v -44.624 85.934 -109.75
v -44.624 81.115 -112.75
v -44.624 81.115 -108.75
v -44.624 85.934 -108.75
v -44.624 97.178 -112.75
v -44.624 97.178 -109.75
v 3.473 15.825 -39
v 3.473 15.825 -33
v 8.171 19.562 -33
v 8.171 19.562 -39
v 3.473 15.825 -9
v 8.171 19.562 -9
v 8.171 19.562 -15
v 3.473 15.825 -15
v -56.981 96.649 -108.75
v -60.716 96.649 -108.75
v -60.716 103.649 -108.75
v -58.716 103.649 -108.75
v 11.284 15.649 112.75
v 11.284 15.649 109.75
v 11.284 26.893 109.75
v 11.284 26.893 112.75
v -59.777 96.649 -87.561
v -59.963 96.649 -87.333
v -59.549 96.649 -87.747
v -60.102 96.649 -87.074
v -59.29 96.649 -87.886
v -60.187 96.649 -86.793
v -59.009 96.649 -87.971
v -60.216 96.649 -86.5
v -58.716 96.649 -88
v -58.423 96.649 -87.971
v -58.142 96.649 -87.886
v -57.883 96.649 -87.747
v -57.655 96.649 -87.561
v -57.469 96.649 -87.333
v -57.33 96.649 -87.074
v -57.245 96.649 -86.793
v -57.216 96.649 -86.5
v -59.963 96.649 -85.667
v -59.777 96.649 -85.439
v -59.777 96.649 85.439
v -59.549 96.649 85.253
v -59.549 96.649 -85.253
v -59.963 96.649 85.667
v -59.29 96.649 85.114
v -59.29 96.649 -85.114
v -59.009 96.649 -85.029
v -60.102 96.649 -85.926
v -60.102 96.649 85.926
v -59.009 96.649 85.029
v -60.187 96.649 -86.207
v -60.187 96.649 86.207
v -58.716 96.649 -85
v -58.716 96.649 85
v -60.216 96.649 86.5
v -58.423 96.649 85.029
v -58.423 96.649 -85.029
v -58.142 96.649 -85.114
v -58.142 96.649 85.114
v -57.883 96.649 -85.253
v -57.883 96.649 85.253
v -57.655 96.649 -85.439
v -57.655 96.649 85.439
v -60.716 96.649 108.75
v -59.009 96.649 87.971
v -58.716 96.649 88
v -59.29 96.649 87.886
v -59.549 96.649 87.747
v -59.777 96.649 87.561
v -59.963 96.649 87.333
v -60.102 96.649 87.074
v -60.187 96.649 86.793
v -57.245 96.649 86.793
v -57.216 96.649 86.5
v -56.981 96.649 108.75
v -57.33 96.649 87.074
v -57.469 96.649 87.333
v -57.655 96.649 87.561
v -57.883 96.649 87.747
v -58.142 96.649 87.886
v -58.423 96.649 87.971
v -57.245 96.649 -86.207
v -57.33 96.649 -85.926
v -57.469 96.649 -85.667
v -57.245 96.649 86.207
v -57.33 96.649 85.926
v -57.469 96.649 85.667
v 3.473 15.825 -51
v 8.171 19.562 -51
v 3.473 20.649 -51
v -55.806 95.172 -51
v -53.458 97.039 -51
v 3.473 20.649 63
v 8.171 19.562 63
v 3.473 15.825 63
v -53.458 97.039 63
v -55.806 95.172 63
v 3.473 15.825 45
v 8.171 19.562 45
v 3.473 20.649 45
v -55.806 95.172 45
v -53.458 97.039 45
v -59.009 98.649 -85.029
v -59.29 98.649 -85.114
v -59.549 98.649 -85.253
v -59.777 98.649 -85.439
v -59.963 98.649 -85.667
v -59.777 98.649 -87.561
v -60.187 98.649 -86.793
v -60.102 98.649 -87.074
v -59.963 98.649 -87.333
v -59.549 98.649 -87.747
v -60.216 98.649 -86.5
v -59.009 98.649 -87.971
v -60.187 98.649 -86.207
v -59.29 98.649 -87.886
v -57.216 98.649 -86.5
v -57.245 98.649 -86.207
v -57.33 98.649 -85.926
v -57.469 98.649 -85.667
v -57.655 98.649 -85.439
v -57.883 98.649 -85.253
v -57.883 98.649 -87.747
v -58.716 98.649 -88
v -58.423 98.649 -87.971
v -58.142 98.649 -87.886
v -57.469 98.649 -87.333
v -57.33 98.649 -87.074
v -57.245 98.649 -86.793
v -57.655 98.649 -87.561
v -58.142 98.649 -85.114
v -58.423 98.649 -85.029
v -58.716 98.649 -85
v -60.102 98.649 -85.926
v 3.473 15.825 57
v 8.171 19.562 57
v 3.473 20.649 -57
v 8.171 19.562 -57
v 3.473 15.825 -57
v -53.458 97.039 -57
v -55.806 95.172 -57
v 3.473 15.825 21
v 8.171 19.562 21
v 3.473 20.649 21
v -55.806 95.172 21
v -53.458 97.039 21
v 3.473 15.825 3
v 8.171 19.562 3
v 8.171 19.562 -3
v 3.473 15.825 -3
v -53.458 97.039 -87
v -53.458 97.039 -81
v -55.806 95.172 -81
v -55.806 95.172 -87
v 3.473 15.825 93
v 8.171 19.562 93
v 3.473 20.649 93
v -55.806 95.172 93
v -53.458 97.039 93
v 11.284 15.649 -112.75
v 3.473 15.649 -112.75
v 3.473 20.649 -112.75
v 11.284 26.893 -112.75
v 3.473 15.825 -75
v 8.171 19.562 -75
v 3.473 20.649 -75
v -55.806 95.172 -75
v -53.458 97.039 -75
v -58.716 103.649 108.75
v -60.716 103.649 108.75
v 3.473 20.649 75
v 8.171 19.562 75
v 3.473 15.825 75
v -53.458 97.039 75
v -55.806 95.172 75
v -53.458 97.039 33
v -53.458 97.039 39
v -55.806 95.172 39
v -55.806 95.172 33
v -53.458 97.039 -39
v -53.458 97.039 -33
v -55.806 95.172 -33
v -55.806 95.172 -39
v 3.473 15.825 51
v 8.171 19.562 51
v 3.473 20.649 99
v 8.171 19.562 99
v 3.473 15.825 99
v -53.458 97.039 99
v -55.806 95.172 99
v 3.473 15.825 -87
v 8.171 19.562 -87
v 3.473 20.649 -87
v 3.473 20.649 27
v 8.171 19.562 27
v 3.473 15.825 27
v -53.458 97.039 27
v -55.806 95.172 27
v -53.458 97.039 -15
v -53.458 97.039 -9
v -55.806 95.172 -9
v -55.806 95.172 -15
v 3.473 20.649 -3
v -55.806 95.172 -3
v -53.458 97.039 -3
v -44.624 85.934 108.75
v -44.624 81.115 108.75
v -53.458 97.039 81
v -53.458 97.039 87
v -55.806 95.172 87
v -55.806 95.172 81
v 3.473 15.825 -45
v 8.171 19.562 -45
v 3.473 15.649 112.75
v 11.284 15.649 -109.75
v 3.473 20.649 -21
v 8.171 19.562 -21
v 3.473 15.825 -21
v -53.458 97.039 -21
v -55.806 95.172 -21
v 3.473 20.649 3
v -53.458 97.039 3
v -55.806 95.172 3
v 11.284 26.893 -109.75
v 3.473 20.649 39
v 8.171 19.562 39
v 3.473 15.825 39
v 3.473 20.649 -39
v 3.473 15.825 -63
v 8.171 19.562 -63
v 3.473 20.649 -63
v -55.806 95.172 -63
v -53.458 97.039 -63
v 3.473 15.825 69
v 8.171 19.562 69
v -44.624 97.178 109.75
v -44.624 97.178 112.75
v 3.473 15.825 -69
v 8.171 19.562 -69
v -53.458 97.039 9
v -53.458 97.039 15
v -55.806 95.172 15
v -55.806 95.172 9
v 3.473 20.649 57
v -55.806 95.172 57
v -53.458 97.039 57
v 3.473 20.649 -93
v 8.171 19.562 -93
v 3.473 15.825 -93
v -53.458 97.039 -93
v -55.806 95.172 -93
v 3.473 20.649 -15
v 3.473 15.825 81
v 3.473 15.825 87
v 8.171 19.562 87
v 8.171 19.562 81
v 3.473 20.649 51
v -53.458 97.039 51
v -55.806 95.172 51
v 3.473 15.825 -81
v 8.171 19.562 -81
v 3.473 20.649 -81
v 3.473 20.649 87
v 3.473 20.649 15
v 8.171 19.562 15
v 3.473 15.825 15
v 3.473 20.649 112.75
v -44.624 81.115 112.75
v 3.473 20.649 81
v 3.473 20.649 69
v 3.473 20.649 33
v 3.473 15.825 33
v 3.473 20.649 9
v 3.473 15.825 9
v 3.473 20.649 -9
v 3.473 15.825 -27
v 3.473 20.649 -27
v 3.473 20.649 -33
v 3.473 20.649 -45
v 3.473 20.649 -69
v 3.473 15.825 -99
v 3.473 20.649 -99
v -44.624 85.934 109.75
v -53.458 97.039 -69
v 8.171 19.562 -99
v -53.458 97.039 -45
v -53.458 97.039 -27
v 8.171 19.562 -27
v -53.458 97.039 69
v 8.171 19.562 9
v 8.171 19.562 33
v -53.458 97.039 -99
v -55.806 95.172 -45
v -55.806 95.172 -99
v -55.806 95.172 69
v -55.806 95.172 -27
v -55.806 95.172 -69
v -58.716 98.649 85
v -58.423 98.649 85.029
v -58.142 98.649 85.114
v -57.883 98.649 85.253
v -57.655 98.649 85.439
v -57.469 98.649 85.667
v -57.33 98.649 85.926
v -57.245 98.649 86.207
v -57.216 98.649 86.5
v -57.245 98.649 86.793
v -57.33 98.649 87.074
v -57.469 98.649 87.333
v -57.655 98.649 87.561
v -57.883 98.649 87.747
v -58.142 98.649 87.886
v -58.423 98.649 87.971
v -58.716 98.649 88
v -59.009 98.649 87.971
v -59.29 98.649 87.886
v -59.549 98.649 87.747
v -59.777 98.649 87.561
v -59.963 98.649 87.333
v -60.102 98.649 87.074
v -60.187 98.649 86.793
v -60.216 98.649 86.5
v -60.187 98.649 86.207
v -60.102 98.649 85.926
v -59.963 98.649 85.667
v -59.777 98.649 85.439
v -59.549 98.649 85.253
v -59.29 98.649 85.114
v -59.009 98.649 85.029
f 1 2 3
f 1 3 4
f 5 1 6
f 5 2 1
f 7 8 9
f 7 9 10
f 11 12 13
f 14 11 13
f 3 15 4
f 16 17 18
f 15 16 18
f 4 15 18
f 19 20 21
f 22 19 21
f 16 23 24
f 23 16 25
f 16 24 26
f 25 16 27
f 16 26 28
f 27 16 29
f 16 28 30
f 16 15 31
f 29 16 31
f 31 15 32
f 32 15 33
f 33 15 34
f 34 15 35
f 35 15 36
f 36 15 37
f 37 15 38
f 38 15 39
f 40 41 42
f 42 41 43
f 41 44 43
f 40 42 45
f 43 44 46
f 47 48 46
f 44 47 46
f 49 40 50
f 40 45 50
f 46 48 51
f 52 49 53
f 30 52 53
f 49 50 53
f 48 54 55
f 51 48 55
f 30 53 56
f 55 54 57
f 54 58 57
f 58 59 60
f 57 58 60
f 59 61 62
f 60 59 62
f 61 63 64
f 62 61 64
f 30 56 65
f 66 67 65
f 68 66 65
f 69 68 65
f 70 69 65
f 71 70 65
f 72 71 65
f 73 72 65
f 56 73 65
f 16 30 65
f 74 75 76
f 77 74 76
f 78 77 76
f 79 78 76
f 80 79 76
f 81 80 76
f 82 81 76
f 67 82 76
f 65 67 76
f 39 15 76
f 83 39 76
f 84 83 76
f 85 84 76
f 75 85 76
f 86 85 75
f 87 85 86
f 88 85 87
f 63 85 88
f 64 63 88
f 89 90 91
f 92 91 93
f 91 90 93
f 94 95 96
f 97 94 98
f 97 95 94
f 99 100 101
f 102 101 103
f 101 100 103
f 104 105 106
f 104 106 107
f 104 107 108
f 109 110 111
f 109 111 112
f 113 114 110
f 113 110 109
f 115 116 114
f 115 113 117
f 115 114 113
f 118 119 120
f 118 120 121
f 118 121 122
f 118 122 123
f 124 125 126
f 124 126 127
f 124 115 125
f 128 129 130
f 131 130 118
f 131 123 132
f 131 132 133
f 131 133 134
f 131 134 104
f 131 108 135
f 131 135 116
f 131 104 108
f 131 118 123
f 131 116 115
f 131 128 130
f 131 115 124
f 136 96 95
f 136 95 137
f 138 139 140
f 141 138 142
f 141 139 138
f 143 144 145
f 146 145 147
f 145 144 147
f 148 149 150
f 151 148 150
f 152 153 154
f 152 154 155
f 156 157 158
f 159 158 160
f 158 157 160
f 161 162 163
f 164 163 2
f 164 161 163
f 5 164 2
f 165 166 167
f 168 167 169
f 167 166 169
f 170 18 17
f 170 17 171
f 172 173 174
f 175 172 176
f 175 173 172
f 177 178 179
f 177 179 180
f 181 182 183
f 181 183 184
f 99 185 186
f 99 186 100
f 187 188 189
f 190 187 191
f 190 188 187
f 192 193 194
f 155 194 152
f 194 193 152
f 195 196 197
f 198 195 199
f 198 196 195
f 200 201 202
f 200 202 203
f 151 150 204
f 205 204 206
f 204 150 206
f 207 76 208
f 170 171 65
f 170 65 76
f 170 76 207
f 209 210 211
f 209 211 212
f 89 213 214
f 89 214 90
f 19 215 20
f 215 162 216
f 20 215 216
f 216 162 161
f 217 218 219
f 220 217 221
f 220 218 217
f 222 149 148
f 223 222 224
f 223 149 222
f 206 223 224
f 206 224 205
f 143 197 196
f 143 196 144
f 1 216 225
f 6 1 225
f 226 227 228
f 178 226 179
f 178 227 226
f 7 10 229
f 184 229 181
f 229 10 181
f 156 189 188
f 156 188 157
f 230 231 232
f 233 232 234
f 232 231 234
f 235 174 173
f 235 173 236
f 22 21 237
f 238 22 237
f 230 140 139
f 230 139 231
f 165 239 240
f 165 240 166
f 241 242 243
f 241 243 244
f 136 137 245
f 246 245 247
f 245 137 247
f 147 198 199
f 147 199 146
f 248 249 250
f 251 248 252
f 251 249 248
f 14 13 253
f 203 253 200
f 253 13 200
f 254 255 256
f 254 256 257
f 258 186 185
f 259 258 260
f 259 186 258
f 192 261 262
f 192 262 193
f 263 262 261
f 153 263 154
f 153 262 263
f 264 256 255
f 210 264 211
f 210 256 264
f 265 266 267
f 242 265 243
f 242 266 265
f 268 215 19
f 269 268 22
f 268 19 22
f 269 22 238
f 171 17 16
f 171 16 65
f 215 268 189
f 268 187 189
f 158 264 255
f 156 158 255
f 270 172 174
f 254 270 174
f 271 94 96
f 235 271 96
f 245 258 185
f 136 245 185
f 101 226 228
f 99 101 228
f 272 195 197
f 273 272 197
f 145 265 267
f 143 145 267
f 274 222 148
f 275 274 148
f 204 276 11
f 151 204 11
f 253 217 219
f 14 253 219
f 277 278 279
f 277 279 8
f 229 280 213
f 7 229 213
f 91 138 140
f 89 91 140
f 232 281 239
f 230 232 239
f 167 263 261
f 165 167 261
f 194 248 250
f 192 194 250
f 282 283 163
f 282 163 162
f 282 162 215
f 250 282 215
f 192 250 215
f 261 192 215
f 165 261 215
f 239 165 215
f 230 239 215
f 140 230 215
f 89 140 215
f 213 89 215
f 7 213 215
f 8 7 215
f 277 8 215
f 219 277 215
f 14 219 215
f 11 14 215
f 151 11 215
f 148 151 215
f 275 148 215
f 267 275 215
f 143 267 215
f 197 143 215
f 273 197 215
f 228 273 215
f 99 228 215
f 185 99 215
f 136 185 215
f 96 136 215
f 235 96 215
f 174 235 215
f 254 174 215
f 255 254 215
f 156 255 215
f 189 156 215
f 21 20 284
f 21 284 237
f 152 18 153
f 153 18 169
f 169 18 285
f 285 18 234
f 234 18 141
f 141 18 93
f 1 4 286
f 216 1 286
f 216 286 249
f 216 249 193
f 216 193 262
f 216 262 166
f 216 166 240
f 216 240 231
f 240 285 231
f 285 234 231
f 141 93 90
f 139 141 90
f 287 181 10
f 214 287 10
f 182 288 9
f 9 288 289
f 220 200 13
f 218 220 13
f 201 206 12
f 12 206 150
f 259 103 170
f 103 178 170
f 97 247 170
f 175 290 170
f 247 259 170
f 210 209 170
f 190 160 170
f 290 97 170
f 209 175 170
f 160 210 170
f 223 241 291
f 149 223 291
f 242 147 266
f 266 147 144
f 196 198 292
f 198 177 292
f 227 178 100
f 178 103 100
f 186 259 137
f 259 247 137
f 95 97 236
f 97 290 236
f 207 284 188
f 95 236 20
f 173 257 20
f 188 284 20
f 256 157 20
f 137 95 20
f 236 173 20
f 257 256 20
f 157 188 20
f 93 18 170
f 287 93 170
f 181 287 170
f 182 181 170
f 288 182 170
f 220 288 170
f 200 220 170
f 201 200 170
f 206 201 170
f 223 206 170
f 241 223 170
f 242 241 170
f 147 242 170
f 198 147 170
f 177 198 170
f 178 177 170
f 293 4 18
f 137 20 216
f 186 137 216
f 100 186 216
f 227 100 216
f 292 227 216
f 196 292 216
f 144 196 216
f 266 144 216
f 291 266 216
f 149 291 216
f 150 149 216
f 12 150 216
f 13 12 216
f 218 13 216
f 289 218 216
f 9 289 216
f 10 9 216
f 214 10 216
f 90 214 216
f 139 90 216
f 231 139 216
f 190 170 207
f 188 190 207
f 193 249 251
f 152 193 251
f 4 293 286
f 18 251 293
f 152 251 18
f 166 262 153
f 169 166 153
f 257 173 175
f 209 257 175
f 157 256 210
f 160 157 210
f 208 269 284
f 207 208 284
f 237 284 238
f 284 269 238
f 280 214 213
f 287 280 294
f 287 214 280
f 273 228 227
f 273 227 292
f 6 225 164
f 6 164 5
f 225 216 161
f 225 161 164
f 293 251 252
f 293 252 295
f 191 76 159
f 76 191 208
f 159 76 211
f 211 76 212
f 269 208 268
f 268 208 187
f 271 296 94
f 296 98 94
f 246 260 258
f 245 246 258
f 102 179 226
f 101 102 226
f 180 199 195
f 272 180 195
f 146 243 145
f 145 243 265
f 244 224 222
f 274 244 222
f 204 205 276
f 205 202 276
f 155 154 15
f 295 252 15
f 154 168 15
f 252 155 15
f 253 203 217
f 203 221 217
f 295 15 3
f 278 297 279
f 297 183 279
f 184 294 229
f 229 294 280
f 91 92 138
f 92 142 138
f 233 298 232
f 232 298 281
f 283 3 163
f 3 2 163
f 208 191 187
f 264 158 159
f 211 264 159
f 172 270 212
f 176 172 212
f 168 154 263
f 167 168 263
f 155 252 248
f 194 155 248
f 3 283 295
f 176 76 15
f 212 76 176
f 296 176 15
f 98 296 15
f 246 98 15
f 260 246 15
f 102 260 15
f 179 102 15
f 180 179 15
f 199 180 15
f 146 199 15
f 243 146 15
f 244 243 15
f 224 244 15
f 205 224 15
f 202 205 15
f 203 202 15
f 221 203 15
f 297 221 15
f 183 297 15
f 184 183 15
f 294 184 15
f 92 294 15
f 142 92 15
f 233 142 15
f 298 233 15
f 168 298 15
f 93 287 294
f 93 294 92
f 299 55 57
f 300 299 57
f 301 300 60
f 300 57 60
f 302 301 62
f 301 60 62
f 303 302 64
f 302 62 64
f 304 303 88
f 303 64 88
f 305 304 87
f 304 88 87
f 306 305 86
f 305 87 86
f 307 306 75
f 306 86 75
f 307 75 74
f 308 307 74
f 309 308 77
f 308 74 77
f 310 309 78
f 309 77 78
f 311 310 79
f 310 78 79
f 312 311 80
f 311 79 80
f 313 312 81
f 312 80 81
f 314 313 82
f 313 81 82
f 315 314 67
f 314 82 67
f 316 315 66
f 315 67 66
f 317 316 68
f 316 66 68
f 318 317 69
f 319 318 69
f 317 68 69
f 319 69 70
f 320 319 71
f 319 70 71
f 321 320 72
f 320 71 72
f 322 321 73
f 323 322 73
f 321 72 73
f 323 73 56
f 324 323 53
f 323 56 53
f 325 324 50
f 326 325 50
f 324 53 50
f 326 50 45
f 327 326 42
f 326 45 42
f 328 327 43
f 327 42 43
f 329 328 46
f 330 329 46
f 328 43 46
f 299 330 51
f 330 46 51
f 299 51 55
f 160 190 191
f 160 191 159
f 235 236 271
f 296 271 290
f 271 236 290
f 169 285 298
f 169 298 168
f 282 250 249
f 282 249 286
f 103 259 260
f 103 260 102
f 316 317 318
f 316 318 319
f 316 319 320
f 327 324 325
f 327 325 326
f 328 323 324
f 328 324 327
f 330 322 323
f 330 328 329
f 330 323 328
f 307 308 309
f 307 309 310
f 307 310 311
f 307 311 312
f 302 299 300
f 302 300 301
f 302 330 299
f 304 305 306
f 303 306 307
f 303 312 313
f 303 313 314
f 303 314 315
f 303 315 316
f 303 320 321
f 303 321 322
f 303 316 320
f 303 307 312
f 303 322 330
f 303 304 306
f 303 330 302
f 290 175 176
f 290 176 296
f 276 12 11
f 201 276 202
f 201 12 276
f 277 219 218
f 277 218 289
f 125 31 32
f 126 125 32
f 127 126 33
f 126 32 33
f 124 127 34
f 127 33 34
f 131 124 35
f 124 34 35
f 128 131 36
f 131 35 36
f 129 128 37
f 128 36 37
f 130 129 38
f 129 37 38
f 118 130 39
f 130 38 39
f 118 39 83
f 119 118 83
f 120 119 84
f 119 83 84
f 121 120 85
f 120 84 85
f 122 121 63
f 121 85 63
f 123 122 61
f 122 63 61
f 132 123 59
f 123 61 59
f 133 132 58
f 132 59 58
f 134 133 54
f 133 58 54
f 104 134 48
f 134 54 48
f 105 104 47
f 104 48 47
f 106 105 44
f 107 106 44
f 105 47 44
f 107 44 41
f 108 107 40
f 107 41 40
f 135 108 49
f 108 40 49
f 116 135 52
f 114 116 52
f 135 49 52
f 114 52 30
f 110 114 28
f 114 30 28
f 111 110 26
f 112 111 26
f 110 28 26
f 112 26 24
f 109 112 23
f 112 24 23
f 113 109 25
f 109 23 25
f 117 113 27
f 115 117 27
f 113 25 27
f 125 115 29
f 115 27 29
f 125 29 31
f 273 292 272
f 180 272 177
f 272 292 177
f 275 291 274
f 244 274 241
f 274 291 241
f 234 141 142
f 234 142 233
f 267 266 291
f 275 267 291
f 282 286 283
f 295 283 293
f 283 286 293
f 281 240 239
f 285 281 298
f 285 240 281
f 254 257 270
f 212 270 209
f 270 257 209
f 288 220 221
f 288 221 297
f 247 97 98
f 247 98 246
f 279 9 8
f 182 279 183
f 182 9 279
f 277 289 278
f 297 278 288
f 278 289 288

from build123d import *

# Parameters (mm, degrees)
EXTRUDE_1_DEPTH     = 112
EXTRUDE_START       = -2.25
EXTRUDE_2_DEPTH     = 3
SKETCH_9_W          = 6
SKETCH_9_H          = 99
CUT_EXTRUDE_3_DEPTH = 10
SKETCH_10_W         = 225.5
SKETCH_10_H         = 7
EXTRUDE_3_DEPTH     = 2
SKETCH_5_R          = 1.5
CUT_EXTRUDE_2_DEPTH = 2
CUT_EXTRUDE_4_DEPTH = 4


with BuildPart() as part:
    # 草图1 → 凸台-拉伸1 (new, symmetric)
    with BuildSketch(Plane.XY):
        Polygon((11.28405341, 15.648913828), (3.47340992, 15.648913828), (3.47340992, 20.648913828), (-56.981135534, 96.648913828), (-58.71594659, 96.648913828), (-58.71594659, 103.648913828), align=None)
    extrude(amount=EXTRUDE_1_DEPTH, both=True)

    # 草图8 → 凸台-拉伸2 (add)
    with BuildSketch(Plane(origin=(0, 0, -112), x_dir=(-1, 0, 0), z_dir=(0, 0, -1)).offset(EXTRUDE_START)):
        Polygon((-3.47340992, 15.648913828), (-11.28405341, 15.648913828), (-11.28405341, 26.893468065), (49.77141481, 103.648913828), (58.71594659, 103.648913828), (58.71594659, 96.648913828), (56.981135534, 96.648913828), (-3.47340992, 20.648913828), align=None)
    extrude_2 = extrude(amount=EXTRUDE_2_DEPTH)

    # 镜向1: 凸台-拉伸2 across plane
    add(extrude_2.mirror(Plane.XY))

    # 草图9 → 切除-拉伸3 (cut)
    with BuildSketch(Plane(origin=(14.535037867, 11.561961939, 0), x_dir=(0, 0, -1), z_dir=(0.7826010541756485, 0.6225235658215388, 0))):
        with Locations((12, 59.722267293)):
            Rectangle(SKETCH_9_W, SKETCH_9_H)
        with Locations((0, 59.722267293)):
            Rectangle(SKETCH_9_W, SKETCH_9_H)
        with Locations((24, 59.722267293)):
            Rectangle(SKETCH_9_W, SKETCH_9_H)
        with Locations((36, 59.722267293)):
            Rectangle(SKETCH_9_W, SKETCH_9_H)
        with Locations((48, 59.722267293)):
            Rectangle(SKETCH_9_W, SKETCH_9_H)
        with Locations((60, 59.722267293)):
            Rectangle(SKETCH_9_W, SKETCH_9_H)
        with Locations((72, 59.722267293)):
            Rectangle(SKETCH_9_W, SKETCH_9_H)
        with Locations((84, 59.722267293)):
            Rectangle(SKETCH_9_W, SKETCH_9_H)
        with Locations((96, 59.722267293)):
            Rectangle(SKETCH_9_W, SKETCH_9_H)
        with Locations((-12, 59.722267293)):
            Rectangle(SKETCH_9_W, SKETCH_9_H)
        with Locations((-24, 59.722267293)):
            Rectangle(SKETCH_9_W, SKETCH_9_H)
        with Locations((-36, 59.722267293)):
            Rectangle(SKETCH_9_W, SKETCH_9_H)
        with Locations((-48, 59.722267293)):
            Rectangle(SKETCH_9_W, SKETCH_9_H)
        with Locations((-60, 59.722267293)):
            Rectangle(SKETCH_9_W, SKETCH_9_H)
        with Locations((-72, 59.722267293)):
            Rectangle(SKETCH_9_W, SKETCH_9_H)
        with Locations((-84, 59.722267293)):
            Rectangle(SKETCH_9_W, SKETCH_9_H)
        with Locations((-96, 59.722267293)):
            Rectangle(SKETCH_9_W, SKETCH_9_H)
    extrude(amount=-CUT_EXTRUDE_3_DEPTH, mode=Mode.SUBTRACT)

    # 草图10 → 凸台-拉伸3 (add)
    with BuildSketch(Plane.ZY.offset(58.71594659)):
        with Locations((0, 100.148913828)):
            Rectangle(SKETCH_10_W, SKETCH_10_H)
    extrude(amount=EXTRUDE_3_DEPTH)

    # 草图5 → 切除-拉伸2 (cut)
    with BuildSketch(Plane.XZ.offset(-96.648913828)):
        with Locations(Location((-58.71594659, -86.5, 0), (0, 0, 270))):
            Circle(SKETCH_5_R)
        with Locations(Location((-58.71594659, 86.5, 0), (0, 0, 270))):
            Circle(SKETCH_5_R)
    extrude(amount=-CUT_EXTRUDE_2_DEPTH, mode=Mode.SUBTRACT)

    # 草图12 → 切除-拉伸4 (cut)
    with BuildSketch(Plane.XY.offset(112.75)):
        Polygon((-60.71594659, 103.648913828), (-60.71594659, 96.597994862), (-56.981135534, 96.648913828), (-44.624218302, 81.114503593), (-44.624218302, 97.178152504), (-49.77141481, 103.648913828), align=None)
    cut_extrude_4 = extrude(amount=-CUT_EXTRUDE_4_DEPTH, mode=Mode.SUBTRACT)

    # 镜向2: 切除-拉伸4 across plane
    add(cut_extrude_4.mirror(Plane.XY), mode=Mode.SUBTRACT)


solid = part.part
